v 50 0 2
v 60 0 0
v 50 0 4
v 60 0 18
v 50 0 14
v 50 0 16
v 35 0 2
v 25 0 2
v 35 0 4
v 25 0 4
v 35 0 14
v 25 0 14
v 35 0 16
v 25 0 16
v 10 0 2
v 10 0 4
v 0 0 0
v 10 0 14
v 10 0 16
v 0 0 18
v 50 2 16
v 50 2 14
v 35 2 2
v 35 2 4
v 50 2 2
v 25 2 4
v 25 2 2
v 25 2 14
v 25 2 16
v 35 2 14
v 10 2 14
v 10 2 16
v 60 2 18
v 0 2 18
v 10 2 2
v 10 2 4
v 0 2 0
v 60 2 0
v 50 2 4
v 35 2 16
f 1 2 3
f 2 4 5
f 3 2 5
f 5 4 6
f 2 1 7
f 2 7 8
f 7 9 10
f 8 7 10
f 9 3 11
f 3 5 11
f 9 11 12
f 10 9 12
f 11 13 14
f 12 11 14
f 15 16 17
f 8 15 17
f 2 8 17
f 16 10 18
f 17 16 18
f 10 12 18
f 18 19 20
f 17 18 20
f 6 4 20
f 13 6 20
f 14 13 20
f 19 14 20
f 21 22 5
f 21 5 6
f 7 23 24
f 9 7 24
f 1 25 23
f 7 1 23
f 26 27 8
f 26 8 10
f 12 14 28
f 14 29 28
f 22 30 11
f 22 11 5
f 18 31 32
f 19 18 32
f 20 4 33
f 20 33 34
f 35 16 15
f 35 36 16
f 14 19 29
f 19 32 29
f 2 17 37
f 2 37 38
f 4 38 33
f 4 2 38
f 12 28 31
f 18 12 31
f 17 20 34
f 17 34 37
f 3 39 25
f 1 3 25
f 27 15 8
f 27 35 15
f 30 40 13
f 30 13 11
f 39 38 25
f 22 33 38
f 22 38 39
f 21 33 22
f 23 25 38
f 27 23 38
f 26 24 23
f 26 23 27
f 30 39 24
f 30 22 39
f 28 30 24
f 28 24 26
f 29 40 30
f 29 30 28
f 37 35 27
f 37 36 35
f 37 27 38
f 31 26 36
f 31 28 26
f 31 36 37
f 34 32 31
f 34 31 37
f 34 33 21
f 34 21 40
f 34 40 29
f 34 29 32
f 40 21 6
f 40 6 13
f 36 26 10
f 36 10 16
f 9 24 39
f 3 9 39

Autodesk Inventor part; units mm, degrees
ref_plane "YZ Plane" through (0, 0, 0) normal (1, 0, 0) x (0, 1, 0)
ref_plane "XZ Plane" through (0, 0, 0) normal (0, 1, 0) x (-1, 0, 0)
ref_plane "XY Plane" through (0, 0, 0) normal (0, 0, 1) x (1, 0, 0)
sketch "Sketch1" plane through (0, 0, 0) normal (0, 1, 0) x (-1, 0, 0)
  line L0 (0, 0) -> (-60, 0)
  line L1 (-60, 0) -> (-60, 18)
  line L2 (-60, 18) -> (0, 18)
  line L3 (0, 18) -> (0, 0)
  dimension "d0" = 60
  dimension "d1" = 18
extrude "Extrusion1" add sketch "Sketch1" along normal blind 2
sketch "Sketch3" plane through (0, 2, 0) normal (0, 1, 0) x (1, 0, 0)
  line L0 (10, -16) -> (25, -16)
  line L1 (25, -16) -> (25, -14)
  line L2 (25, -14) -> (10, -14)
  line L3 (10, -14) -> (10, -16)
  line L4 (10, -2) -> (25, -2)
  line L5 (25, -2) -> (25, -4)
  line L6 (25, -4) -> (10, -4)
  line L7 (10, -4) -> (10, -2)
  line L8 (60, 0) -> (0, 0) projected
  line L9 (0, 0) -> (0, -18) projected
  line L10 (0, -18) -> (60, -18) projected
  line L11 (60, -18) -> (60, 0) projected
  line L12 (30, 6.382) -> (30, -24.5999) construction
  line L13 (50, -16) -> (35, -16)
  line L14 (35, -16) -> (35, -14)
  line L15 (35, -14) -> (50, -14)
  line L16 (50, -14) -> (50, -16)
  line L17 (50, -2) -> (35, -2)
  line L18 (35, -2) -> (35, -4)
  line L19 (35, -4) -> (50, -4)
  line L20 (50, -4) -> (50, -2)
  dimension "d13" = 15
  dimension "d14" = 2
  dimension "d15" = 15
  dimension "d16" = 2
  dimension "d17" = 10
  dimension "d18" = 0
  dimension "d19" = 2
  dimension "d20" = 10
  dimension "d21" = 10
extrude "Extrusion3" cut sketch "Sketch3" against normal through all contours L3 L2 L1 L0 | L4 L5 L6 L7 | L13 L14 L15 L16 | L20 L19 L18 L17
properties part number "Mounting_base"
